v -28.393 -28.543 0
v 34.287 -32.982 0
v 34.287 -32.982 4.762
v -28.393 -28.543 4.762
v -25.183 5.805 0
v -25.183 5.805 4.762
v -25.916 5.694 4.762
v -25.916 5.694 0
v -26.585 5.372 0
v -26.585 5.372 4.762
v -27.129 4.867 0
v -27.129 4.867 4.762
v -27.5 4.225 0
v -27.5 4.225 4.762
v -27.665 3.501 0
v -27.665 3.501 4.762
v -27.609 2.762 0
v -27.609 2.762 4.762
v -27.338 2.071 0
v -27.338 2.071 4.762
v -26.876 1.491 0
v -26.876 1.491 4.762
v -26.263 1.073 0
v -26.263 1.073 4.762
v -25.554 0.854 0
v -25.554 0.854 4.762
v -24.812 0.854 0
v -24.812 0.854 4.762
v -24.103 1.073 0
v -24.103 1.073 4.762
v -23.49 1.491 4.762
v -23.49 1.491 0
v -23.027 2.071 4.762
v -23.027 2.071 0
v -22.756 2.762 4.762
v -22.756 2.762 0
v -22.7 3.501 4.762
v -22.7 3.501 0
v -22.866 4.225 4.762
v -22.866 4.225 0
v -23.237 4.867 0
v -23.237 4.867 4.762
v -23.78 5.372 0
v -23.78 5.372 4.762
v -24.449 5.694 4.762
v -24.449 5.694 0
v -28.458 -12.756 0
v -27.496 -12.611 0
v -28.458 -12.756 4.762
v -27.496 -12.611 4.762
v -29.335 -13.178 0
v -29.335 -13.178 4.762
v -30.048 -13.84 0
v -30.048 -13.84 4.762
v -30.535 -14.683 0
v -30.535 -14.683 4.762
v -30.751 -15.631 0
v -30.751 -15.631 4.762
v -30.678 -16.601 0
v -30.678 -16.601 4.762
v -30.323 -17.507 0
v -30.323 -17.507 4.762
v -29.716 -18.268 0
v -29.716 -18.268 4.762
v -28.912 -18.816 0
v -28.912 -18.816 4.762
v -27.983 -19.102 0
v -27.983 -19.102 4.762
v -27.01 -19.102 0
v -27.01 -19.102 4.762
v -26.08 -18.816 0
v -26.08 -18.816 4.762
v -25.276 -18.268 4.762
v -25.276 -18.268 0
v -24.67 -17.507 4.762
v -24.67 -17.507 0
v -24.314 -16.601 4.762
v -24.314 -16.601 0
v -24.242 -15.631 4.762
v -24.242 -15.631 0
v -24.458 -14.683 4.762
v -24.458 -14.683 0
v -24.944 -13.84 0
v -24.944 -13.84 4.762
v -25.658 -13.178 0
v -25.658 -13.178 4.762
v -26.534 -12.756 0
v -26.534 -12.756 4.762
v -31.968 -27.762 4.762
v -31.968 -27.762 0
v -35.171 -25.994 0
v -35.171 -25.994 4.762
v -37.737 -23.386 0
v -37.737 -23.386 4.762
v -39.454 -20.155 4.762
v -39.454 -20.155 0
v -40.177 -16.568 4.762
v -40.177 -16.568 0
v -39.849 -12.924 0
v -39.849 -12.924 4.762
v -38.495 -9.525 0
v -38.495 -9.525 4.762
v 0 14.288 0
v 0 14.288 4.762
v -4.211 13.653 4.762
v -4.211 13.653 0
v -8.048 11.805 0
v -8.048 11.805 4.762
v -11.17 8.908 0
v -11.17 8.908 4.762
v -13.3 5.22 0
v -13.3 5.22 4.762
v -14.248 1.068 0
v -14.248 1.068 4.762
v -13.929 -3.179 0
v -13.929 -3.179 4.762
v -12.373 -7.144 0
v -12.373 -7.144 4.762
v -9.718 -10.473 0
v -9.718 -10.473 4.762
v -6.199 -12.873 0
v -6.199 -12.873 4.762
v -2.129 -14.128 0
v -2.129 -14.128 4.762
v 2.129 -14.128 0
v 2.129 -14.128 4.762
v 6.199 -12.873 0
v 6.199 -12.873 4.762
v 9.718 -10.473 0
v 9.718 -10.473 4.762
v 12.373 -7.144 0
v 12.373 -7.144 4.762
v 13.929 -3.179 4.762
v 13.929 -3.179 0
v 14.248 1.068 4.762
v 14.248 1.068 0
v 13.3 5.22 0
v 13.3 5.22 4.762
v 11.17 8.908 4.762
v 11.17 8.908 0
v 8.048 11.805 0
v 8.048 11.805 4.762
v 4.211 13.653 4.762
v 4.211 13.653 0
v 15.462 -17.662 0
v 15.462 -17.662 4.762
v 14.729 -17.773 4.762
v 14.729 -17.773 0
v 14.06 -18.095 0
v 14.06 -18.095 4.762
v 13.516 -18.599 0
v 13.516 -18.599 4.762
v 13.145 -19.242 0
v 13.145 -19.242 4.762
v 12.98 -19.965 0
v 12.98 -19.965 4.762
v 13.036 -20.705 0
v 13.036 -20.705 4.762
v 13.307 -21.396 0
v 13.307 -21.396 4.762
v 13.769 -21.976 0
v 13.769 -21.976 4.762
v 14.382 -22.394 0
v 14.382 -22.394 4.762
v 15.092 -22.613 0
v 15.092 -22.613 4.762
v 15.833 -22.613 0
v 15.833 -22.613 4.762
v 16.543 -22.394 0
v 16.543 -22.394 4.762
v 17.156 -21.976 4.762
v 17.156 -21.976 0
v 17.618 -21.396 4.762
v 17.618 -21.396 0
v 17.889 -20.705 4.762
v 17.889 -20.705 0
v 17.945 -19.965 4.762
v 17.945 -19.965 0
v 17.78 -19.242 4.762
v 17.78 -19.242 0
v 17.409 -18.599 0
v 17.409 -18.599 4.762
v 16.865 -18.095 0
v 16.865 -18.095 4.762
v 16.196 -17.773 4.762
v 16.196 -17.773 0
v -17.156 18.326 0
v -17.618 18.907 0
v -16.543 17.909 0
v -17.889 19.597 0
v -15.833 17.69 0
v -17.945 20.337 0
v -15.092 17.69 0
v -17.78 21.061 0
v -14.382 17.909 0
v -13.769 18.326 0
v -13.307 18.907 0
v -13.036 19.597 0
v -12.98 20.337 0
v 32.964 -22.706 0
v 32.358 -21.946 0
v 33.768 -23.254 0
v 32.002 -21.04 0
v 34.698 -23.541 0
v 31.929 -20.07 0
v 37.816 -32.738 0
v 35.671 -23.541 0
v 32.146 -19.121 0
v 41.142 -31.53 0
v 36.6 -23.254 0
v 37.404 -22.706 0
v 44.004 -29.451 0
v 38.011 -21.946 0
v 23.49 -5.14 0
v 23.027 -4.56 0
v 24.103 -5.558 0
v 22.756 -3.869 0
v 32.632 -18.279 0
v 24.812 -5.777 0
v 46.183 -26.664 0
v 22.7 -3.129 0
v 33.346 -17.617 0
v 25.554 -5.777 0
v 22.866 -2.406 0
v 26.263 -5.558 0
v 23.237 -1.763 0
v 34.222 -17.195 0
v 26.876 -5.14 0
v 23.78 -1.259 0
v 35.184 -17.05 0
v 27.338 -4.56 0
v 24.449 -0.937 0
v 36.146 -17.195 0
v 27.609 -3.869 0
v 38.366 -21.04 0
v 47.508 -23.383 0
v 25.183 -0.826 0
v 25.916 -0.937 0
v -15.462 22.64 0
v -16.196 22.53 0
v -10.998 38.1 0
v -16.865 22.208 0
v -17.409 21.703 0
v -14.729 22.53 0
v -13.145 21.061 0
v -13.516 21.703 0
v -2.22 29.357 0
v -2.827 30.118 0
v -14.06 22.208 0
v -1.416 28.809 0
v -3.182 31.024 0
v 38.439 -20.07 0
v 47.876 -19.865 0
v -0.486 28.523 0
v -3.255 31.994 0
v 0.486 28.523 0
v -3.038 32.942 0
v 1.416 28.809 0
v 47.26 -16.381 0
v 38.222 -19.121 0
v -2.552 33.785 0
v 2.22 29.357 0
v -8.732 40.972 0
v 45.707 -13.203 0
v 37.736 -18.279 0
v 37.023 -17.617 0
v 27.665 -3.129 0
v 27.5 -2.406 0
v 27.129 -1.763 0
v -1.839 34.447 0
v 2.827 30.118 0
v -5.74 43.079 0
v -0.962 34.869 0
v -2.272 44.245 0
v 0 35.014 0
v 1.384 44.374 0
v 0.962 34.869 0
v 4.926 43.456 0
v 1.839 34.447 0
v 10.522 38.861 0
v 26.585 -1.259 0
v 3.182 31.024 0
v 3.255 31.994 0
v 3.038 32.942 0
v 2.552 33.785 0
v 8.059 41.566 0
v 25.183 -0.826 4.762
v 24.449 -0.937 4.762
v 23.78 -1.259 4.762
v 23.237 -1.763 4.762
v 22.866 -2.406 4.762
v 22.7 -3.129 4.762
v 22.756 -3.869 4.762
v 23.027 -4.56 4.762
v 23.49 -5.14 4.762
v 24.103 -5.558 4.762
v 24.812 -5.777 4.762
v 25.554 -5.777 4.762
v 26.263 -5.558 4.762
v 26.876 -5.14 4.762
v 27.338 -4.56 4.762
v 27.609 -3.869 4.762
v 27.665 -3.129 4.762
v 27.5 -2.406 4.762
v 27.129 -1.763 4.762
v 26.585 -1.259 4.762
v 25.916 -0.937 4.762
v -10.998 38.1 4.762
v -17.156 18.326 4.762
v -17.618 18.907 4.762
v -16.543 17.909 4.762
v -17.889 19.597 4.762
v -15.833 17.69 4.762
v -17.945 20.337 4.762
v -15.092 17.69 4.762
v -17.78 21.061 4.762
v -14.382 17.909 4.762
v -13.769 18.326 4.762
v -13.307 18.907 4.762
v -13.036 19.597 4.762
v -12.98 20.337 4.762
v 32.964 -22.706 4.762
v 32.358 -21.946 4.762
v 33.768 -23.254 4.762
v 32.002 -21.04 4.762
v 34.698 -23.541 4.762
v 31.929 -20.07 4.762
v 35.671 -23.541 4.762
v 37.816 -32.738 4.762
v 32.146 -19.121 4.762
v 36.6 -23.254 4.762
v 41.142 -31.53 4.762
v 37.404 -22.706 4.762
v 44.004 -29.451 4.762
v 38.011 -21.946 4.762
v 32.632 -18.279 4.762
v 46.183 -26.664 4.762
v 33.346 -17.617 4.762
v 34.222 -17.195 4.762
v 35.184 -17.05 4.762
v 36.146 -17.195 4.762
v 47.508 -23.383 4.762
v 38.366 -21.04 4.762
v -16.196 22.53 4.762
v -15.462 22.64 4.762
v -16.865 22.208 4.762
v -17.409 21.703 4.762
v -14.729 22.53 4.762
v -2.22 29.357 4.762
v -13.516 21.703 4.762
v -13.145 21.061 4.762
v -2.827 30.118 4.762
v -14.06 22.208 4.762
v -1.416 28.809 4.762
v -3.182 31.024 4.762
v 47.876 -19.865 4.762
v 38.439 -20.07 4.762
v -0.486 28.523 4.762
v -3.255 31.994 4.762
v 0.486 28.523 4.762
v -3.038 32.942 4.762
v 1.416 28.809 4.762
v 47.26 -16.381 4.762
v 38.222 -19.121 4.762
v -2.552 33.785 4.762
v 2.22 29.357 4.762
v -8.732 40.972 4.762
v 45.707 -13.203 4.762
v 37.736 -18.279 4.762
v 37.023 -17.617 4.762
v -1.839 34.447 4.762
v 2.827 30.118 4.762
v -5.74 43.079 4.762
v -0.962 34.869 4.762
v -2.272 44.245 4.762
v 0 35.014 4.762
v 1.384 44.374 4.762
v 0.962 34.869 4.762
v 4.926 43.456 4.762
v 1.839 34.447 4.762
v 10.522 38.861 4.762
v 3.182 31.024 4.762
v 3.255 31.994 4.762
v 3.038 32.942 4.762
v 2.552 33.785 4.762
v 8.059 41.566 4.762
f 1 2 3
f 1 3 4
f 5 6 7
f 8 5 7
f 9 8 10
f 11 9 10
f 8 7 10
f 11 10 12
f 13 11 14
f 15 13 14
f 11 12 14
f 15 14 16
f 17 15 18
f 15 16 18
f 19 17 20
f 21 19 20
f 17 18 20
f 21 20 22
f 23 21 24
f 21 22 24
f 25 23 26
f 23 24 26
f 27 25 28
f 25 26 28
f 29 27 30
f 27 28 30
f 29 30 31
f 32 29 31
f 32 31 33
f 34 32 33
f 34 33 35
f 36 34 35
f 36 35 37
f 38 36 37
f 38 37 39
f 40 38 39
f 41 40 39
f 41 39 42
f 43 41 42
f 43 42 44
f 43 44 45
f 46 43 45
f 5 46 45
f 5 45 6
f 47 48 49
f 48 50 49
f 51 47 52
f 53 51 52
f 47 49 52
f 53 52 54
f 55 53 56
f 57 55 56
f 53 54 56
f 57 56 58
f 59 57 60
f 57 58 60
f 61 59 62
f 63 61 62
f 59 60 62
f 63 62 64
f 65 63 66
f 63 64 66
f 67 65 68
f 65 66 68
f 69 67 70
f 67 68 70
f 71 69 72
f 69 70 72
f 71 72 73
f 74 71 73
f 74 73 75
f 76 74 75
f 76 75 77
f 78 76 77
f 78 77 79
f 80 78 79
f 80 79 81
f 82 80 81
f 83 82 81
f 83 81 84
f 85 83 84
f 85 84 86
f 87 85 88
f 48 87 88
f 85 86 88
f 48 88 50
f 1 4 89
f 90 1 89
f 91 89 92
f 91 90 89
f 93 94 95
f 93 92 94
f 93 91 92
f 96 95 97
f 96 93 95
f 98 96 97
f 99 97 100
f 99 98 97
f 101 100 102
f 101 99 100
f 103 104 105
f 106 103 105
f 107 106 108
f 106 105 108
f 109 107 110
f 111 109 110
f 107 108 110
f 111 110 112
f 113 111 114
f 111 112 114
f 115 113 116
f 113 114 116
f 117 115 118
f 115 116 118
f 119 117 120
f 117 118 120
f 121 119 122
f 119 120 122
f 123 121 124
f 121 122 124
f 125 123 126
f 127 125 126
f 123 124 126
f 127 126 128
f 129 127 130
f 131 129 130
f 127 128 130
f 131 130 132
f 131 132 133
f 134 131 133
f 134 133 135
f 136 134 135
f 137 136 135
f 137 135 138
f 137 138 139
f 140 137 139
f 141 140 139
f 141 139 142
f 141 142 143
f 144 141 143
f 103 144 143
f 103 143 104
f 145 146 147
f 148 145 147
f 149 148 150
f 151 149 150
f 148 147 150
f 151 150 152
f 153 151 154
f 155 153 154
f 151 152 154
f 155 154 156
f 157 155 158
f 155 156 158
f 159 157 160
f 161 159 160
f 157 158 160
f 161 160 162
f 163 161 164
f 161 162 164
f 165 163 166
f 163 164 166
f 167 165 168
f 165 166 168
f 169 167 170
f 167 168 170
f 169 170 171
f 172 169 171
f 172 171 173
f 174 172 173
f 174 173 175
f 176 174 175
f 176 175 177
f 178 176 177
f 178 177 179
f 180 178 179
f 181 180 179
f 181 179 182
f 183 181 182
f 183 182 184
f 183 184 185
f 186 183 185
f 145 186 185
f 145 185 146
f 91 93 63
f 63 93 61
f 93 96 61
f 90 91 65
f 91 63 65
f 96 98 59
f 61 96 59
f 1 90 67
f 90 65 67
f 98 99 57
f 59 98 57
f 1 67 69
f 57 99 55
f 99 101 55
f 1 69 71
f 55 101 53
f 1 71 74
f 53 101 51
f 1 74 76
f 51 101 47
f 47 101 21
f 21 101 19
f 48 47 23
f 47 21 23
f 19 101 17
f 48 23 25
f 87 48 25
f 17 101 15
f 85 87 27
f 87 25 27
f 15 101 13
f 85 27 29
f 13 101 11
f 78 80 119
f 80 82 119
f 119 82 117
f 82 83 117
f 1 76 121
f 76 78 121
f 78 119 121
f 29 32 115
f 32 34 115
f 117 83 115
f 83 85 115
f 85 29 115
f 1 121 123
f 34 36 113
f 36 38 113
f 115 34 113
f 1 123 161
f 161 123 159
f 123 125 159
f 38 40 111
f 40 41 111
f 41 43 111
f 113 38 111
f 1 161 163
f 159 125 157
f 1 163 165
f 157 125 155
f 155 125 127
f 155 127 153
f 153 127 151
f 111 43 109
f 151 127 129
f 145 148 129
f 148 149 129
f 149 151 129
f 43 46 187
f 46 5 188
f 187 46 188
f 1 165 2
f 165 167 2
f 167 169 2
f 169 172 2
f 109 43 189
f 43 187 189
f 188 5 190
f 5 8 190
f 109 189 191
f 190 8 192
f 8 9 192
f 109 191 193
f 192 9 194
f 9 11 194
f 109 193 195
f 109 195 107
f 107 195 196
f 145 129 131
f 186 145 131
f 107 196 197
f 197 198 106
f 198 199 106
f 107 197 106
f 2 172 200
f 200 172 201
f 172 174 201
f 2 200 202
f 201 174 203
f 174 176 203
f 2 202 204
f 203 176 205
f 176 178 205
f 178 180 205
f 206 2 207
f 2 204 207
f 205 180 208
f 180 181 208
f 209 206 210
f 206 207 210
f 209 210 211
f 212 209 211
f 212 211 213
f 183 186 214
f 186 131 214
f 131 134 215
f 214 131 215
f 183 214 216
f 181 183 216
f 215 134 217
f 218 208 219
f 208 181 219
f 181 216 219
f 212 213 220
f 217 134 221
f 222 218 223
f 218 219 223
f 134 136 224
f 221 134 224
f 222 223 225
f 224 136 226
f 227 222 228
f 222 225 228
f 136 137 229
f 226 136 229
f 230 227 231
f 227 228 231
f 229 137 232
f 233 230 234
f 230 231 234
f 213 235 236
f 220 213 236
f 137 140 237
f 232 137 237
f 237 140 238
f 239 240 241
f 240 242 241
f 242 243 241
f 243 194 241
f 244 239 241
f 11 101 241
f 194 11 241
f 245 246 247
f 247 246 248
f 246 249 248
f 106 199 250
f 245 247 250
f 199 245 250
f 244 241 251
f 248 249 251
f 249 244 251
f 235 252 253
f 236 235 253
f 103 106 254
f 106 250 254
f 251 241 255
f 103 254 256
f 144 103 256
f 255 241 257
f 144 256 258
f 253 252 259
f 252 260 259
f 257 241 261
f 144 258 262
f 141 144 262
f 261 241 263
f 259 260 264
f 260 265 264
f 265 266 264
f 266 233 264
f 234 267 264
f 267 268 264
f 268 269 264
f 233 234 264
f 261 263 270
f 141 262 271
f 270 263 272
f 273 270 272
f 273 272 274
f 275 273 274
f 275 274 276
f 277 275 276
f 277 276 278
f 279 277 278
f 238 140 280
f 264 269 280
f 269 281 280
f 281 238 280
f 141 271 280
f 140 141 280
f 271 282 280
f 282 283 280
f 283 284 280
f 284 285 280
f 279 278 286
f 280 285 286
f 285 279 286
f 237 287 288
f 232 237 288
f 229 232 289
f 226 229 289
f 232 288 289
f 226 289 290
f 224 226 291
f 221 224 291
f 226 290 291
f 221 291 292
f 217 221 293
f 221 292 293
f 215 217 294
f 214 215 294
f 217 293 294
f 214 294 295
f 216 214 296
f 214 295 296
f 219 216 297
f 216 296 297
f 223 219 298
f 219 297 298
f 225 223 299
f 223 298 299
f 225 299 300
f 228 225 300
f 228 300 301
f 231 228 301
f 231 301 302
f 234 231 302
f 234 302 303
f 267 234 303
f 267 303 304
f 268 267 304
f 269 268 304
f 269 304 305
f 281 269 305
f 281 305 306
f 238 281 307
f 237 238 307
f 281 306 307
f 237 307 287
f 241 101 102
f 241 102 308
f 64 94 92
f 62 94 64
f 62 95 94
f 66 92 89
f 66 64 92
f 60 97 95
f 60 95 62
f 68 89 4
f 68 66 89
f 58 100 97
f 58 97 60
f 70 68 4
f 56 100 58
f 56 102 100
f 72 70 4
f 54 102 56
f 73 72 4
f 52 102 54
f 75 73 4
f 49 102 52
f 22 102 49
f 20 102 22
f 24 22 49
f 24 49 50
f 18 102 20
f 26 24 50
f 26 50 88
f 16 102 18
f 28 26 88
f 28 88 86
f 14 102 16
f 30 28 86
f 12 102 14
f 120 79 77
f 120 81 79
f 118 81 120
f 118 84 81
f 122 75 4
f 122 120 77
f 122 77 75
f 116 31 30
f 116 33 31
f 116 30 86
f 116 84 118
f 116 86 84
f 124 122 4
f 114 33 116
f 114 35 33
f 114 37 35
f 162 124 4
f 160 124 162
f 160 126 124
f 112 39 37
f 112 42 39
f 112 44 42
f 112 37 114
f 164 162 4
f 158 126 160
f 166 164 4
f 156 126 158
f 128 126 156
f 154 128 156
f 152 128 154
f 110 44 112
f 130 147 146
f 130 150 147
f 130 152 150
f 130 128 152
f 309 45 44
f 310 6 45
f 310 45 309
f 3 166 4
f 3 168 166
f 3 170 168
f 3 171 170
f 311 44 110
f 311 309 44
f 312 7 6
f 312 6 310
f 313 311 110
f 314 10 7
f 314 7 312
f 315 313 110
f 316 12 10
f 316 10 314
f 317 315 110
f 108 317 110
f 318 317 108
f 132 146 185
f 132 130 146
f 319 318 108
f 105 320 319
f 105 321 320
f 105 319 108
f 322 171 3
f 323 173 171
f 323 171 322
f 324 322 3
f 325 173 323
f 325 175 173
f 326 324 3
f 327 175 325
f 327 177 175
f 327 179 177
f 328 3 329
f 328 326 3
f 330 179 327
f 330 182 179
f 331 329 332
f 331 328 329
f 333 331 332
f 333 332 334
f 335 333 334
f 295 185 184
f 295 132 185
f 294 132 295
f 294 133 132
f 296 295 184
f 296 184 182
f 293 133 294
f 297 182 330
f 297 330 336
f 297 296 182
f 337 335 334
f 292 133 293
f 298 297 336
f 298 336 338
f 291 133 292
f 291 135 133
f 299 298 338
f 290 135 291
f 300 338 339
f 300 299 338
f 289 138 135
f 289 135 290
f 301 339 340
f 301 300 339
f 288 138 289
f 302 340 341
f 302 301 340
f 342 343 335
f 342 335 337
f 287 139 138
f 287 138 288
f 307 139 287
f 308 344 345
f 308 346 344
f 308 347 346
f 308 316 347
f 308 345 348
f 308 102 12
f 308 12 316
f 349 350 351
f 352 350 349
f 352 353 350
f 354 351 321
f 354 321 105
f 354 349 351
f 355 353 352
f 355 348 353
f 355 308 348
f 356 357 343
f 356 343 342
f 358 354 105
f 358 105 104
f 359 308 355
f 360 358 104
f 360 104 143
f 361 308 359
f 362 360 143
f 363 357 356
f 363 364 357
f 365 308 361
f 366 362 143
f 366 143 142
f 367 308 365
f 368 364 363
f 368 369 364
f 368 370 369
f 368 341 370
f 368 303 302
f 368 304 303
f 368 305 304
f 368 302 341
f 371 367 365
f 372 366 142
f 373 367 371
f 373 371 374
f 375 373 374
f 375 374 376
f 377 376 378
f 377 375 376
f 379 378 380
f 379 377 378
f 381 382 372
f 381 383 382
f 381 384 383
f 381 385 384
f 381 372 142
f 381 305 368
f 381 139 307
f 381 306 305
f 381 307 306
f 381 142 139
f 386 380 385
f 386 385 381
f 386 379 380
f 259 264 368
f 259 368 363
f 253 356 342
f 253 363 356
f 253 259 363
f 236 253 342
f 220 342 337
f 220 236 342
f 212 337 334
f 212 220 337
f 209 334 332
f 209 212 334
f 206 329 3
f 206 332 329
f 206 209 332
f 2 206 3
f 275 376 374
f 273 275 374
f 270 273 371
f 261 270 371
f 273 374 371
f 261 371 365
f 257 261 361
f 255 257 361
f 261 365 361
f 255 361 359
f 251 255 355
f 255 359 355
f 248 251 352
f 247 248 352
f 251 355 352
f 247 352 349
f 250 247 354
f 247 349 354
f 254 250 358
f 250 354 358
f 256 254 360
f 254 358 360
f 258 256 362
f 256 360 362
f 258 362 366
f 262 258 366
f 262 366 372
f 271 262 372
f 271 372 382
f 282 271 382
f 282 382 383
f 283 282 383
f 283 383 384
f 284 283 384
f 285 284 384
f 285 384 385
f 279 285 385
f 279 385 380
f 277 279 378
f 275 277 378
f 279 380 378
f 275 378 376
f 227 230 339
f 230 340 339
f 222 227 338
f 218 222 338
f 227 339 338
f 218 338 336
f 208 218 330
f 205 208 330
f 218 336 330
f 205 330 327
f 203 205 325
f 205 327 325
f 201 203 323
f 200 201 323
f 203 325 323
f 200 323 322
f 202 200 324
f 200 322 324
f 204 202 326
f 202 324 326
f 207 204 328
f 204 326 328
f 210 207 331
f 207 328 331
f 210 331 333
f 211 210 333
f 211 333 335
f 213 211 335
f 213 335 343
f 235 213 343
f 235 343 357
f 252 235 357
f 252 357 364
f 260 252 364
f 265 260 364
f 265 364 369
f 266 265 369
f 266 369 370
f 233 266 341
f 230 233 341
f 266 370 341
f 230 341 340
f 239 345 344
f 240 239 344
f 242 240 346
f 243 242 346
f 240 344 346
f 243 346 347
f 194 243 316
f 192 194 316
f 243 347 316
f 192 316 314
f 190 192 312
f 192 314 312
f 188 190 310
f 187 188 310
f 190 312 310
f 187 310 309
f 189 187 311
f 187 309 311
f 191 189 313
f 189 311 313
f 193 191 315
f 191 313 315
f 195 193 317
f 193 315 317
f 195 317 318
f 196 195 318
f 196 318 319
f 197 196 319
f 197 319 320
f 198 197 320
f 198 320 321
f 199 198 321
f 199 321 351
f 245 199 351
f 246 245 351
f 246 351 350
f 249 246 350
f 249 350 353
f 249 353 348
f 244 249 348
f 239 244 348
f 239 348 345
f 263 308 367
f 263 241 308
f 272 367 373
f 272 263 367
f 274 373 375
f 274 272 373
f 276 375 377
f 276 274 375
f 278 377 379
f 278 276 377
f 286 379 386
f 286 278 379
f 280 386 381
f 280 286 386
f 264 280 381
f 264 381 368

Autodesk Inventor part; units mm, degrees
ref_plane "YZ Plane" through (0, 0, 0) normal (1, 0, 0) x (0, 1, 0)
ref_plane "XZ Plane" through (0, 0, 0) normal (0, 1, 0) x (-1, 0, 0)
ref_plane "XY Plane" through (0, 0, 0) normal (0, 0, 1) x (1, 0, 0)
sketch "Sketch2" plane through (0, 0, 0) normal (0, 0, 1) x (1, 0, 0)
  line L0 (27.4963, -15.875) -> (0, 0) construction
  arc A0 (-38.4948, -9.525) -> (-28.3934, -28.5433) centre (-27.4963, -15.875) ccw
  arc A1 (10.5225, 38.861) -> (-10.9985, 38.1) centre (0, 31.75) ccw
  line L1 (-38.4948, -9.525) -> (-10.9985, 38.1)
  line L2 (10.5225, 38.861) -> (45.7067, -13.2026)
  line L3 (34.2871, -32.9819) -> (-28.3934, -28.5433)
  circle A2 centre (-182.5755, 105.41) radius 190.5 construction
  line L4 (-182.5755, 105.41) -> (0, 0) construction
  line L5 (-133.2704, -78.5989) -> (50.7384, -29.2938) construction
  line L6 (50.7384, -29.2938) -> (1.4334, 154.715) construction
  line L7 (50.7384, -29.2938) -> (0, 0) construction
  arc A3 (34.2871, -32.9819) -> (45.7067, -13.2026) centre (35.1842, -20.3136) ccw
  point P0 (0, 0)
  point P1 (-25.1827, 3.3154)
  point P2 (-20.1512, -15.4625)
  point P3 (-3.3154, -25.1827)
  point P4 (15.4625, -20.1512)
  point P5 (25.1827, -3.3154)
  point P6 (20.1512, 15.4625)
  point P7 (3.3154, 25.1827)
  point P8 (-15.4625, 20.1512)
  dimension "d74" = 31.75
  dimension "d77" = 360
  dimension "d80" = 25.4
  dimension "d83" = 360
  dimension "d96" = 381
  dimension "d97" = 210.82
  dimension "d98" = 12.7
  dimension "d99" = 12.7
  dimension "d100" = 12.7
extrude "Plate2" add sketch "Sketch2" along normal blind 4.7625
hole "Hole3" at (35.1842, -20.3136, 0) at (-27.4963, -15.875, 0) at (0, 31.75, 0) direction (0, 0, 1) diameter 6.5278 end through all clearance for "Flat Head Machine Screw (82)" size "1/4" standard "Ansi Unified Screw Threads"
hole "Hole4" at (0, 0, 0) direction (0, 0, 1) diameter 28.575 end through all
hole "Hole5" at (-25.1827, 3.3154, 0) at (15.4625, -20.1512, 0) at (25.1827, -3.3154, 0) at (-15.4625, 20.1512, 0) direction (0, 0, 1) diameter 4.9784 end through all clearance for "Flat Head Machine Screw (82)" size "#10" standard "Ansi Unified Screw Threads"
equation "\"BendRadius\" = Thickness"
equation "\"BendReliefWidth\" = Thickness"
equation "\"BendReliefDepth\" = 0.5 * Thickness"
equation "\"CornerReliefSize\" = 4 * Thickness"
equation "\"MinimumRemnant\" = 2 * Thickness"
equation "\"TransitionRadius\" = BendRadius"
equation "\"JacobiRadiusSize\" = BendRadius"
equation "\"GapSize\" = Thickness"
equation "\"Thickness\" = 4.7625"
properties part number "PLATE,TURRET,MOTOR,MOUNT" material "Aluminum 6061"
